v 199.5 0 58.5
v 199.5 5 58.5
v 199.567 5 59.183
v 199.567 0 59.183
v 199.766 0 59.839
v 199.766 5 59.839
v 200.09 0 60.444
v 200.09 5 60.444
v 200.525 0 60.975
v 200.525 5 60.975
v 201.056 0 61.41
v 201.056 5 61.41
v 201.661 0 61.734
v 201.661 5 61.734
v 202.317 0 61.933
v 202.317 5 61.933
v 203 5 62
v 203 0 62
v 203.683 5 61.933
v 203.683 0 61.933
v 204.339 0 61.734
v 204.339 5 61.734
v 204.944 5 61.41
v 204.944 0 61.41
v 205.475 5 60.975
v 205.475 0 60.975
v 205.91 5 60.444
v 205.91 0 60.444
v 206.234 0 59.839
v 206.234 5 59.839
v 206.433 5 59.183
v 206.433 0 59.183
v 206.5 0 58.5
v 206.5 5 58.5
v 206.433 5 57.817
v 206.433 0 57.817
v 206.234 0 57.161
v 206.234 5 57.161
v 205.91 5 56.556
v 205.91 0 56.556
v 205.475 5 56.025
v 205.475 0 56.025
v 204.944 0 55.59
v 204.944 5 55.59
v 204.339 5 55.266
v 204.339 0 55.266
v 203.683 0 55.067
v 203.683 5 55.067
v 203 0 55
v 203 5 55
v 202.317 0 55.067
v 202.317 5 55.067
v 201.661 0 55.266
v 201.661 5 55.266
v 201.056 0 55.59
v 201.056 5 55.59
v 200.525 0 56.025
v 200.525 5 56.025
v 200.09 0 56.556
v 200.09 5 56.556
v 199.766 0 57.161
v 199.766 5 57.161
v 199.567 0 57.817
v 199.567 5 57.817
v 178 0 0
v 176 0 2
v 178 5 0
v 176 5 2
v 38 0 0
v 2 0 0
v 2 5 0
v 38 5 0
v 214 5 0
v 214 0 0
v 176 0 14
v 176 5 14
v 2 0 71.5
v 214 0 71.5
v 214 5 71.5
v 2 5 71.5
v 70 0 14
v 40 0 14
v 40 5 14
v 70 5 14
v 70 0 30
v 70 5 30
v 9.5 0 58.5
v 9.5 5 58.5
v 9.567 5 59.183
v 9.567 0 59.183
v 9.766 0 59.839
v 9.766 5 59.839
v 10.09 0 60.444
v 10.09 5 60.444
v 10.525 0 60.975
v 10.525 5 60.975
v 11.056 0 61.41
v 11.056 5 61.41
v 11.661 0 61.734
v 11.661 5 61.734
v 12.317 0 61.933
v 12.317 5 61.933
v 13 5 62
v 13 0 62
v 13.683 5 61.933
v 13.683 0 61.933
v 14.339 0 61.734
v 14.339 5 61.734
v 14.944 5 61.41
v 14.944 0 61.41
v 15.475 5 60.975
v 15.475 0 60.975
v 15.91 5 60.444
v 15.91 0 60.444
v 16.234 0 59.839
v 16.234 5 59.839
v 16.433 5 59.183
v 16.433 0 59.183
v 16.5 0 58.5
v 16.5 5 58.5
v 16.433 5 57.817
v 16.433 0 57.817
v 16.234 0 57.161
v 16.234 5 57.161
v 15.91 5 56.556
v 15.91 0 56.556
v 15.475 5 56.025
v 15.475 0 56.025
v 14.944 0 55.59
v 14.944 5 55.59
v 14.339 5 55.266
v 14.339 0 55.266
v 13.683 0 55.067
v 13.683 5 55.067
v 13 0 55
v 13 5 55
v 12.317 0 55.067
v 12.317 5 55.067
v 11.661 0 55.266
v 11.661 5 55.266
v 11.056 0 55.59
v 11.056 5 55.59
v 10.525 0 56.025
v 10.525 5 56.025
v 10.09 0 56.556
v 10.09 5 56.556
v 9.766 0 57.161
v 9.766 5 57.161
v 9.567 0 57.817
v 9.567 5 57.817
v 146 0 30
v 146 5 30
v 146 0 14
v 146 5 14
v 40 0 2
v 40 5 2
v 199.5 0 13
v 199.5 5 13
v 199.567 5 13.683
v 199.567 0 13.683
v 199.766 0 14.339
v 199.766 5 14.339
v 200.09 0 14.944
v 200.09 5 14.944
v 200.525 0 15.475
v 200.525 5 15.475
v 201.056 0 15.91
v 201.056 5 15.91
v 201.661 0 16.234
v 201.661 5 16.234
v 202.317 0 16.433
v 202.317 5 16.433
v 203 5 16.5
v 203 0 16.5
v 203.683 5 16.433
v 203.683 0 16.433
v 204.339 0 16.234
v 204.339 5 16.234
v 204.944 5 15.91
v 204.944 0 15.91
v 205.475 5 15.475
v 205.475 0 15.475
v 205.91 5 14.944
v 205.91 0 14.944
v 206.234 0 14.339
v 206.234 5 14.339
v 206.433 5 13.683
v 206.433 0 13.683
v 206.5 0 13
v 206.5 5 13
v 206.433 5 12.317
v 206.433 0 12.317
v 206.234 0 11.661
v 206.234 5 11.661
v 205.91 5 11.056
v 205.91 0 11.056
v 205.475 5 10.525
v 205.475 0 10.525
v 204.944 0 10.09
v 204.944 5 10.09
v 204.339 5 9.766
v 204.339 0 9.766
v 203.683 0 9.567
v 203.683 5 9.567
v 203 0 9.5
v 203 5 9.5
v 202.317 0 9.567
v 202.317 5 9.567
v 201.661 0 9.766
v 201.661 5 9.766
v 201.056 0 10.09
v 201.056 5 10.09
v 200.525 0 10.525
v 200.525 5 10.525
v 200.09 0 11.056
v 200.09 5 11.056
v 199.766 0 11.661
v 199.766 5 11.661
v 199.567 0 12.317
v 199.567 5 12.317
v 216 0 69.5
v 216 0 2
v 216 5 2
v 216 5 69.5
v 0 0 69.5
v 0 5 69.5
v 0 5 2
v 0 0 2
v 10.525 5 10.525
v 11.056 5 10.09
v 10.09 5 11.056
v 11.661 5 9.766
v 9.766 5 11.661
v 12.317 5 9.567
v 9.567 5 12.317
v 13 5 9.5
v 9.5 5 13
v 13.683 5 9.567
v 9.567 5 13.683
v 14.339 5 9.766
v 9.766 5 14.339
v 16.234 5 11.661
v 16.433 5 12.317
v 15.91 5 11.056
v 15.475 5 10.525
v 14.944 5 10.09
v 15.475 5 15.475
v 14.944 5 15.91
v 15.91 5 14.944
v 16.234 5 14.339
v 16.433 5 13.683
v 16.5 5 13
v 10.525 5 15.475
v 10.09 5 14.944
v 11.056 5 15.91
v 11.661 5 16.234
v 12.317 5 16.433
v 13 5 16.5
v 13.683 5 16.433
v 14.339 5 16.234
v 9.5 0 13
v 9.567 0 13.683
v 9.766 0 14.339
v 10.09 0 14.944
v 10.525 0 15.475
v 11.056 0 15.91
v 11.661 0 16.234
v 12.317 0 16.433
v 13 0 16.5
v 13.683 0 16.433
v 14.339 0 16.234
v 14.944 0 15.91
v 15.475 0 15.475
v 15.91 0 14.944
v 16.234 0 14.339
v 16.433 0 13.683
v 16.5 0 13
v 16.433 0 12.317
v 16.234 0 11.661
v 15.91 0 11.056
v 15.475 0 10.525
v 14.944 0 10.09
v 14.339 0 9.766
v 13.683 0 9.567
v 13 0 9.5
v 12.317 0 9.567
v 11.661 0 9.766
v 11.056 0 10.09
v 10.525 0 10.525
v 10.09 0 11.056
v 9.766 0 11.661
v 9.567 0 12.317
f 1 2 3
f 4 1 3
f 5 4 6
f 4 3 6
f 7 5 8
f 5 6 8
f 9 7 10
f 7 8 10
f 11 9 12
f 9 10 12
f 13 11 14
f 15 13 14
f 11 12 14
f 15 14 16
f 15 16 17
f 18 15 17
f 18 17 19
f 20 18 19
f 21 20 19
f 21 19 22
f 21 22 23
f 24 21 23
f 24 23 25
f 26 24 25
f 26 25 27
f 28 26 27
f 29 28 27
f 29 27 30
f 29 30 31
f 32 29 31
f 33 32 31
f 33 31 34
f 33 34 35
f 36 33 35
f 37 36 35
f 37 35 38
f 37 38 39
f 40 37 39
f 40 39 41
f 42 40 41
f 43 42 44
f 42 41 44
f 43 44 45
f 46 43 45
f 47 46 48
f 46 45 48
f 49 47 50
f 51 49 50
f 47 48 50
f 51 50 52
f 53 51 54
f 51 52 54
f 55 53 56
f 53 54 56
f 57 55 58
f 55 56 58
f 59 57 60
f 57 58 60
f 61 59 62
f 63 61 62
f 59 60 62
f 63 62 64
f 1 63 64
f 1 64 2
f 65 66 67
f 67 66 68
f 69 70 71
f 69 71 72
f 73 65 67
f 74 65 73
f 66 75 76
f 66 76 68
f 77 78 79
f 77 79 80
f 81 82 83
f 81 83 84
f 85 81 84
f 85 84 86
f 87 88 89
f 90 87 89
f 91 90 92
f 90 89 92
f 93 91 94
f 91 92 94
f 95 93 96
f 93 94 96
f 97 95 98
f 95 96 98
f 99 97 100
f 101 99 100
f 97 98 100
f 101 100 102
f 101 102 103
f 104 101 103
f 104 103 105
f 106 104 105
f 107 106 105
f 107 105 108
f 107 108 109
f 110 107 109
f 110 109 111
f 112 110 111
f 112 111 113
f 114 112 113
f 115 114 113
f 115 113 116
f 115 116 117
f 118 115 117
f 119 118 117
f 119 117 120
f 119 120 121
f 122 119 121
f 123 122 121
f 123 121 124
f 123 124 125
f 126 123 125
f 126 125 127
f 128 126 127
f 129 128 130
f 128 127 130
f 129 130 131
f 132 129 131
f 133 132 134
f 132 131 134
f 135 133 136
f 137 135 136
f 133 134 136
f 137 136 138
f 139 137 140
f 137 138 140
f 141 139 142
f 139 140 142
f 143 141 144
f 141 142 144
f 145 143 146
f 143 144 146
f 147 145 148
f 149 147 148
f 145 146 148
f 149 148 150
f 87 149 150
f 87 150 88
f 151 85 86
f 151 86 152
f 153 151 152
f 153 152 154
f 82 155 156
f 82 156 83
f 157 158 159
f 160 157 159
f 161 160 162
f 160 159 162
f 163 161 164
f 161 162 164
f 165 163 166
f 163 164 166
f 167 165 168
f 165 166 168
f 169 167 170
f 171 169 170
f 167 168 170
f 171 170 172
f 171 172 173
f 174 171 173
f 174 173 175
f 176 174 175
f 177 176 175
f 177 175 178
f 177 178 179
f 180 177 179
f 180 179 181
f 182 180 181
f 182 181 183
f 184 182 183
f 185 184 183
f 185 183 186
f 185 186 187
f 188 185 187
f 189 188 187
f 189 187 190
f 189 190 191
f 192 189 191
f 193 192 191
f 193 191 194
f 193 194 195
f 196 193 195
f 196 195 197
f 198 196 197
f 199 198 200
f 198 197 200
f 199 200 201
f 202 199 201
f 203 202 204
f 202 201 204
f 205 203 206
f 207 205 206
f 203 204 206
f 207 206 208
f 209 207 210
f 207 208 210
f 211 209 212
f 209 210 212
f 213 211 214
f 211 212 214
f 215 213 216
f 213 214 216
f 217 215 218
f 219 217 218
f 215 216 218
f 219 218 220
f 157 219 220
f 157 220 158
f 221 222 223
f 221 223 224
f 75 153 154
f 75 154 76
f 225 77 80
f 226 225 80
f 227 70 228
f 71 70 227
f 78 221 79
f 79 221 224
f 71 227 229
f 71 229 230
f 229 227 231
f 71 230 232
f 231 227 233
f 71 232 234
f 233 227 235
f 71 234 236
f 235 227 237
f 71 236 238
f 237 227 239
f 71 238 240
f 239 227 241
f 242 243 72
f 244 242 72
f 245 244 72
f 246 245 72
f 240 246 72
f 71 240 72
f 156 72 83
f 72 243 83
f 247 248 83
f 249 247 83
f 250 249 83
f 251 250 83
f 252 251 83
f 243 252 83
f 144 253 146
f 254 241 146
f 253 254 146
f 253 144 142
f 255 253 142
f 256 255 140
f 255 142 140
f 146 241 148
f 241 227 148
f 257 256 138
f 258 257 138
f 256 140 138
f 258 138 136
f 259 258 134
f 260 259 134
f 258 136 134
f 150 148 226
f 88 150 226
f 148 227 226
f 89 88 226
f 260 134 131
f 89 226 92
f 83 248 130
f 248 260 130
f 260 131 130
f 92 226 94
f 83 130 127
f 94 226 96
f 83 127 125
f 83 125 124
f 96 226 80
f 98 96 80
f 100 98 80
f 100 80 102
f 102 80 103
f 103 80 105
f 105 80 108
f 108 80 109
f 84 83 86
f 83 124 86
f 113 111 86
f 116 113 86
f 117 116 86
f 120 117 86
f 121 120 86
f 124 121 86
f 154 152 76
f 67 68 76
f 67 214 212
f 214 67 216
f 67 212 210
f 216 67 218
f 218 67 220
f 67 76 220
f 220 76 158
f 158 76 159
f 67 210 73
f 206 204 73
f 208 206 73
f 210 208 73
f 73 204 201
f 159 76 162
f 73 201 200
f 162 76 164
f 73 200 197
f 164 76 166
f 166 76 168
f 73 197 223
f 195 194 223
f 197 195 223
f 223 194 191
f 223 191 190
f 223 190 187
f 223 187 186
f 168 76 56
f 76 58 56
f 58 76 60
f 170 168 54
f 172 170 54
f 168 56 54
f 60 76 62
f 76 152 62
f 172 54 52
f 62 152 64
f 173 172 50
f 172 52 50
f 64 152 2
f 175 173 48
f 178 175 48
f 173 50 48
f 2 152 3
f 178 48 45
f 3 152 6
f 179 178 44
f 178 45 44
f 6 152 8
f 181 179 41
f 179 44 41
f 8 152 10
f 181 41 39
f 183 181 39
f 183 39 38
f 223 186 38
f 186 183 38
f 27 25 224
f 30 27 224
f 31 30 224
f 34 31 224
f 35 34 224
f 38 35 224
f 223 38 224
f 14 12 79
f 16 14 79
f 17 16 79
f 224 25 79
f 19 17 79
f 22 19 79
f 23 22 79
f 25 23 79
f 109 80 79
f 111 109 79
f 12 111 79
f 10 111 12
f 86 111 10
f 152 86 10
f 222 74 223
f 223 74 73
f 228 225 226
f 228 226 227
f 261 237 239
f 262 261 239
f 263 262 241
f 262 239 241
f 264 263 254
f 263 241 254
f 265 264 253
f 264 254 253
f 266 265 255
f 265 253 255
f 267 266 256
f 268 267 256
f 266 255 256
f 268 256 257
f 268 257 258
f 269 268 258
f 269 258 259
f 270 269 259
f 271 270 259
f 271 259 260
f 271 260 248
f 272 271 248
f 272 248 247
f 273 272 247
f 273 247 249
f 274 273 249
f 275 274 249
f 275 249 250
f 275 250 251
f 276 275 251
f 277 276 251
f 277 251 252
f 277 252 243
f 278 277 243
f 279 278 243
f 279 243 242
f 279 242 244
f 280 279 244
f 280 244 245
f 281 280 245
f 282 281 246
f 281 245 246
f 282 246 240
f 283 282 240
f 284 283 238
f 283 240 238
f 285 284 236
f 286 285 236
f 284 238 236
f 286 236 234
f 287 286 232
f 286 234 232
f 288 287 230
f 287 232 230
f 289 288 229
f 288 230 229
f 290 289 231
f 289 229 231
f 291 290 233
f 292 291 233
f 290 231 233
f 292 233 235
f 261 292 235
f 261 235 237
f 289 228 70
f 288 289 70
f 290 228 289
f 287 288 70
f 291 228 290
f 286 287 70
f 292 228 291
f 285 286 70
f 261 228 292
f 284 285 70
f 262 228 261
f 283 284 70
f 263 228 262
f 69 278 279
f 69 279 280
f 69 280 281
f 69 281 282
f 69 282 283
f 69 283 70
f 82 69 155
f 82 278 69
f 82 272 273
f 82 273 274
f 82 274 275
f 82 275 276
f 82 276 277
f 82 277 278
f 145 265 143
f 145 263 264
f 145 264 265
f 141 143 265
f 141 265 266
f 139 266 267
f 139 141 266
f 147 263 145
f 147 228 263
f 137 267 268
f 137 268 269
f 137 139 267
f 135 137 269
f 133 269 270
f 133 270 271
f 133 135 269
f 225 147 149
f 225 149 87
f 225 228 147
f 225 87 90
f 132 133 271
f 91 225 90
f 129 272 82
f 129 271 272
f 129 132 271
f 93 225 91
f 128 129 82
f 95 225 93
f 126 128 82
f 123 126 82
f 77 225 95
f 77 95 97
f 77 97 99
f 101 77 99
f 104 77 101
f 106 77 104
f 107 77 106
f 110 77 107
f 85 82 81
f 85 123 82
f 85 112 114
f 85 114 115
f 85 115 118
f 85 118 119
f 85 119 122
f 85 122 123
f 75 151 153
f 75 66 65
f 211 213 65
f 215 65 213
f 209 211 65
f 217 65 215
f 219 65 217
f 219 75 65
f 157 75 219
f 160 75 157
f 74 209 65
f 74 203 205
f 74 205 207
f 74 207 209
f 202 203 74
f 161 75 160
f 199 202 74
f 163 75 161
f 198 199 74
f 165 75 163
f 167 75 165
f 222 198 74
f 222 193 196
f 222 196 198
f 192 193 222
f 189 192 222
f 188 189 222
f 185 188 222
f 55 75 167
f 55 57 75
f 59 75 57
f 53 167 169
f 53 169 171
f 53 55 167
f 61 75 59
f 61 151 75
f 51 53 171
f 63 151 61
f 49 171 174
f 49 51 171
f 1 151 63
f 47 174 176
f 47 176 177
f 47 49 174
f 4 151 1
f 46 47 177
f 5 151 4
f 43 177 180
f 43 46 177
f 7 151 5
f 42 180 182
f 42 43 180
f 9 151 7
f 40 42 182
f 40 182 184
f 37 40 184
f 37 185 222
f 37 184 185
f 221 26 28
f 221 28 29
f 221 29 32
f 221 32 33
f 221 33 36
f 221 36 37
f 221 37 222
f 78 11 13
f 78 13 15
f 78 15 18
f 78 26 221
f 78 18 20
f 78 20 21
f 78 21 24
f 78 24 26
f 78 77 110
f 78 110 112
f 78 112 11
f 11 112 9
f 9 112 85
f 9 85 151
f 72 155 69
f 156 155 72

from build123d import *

# Parameters (mm, degrees)
F1_DEPTH = 5
F2_D     = 7
F3_SIZE  = 2


with BuildPart() as f1:
    # F0 (on Front) → F1 (new body)
    with BuildSketch(Plane.XZ):
        Polygon((0, 71.5), (0, 0), (40, 0), (40, 14), (70, 14), (70, 30), (146, 30), (146, 14), (176, 14), (176, 0), (216, 0), (216, 71.5), align=None)
    extrude(amount=-F1_DEPTH)

    # F2 (through all)
    with Locations(Plane.XZ):
        with Locations((203, 58.5), (203, 13), (13, 13), (13, 58.5)):
            Hole(F2_D / 2)

    # F3
    f3_edges = [f1.edges().sort_by_distance(p)[0] for p in [
        (216, 2.5, 71.5),
        (216, 2.5, 0),
        (176, 2.5, 0),
        (40, 2.5, 0),
        (0, 2.5, 0),
        (0, 2.5, 71.5),
    ]]
    chamfer(f3_edges, length=F3_SIZE)


solid = f1.part
